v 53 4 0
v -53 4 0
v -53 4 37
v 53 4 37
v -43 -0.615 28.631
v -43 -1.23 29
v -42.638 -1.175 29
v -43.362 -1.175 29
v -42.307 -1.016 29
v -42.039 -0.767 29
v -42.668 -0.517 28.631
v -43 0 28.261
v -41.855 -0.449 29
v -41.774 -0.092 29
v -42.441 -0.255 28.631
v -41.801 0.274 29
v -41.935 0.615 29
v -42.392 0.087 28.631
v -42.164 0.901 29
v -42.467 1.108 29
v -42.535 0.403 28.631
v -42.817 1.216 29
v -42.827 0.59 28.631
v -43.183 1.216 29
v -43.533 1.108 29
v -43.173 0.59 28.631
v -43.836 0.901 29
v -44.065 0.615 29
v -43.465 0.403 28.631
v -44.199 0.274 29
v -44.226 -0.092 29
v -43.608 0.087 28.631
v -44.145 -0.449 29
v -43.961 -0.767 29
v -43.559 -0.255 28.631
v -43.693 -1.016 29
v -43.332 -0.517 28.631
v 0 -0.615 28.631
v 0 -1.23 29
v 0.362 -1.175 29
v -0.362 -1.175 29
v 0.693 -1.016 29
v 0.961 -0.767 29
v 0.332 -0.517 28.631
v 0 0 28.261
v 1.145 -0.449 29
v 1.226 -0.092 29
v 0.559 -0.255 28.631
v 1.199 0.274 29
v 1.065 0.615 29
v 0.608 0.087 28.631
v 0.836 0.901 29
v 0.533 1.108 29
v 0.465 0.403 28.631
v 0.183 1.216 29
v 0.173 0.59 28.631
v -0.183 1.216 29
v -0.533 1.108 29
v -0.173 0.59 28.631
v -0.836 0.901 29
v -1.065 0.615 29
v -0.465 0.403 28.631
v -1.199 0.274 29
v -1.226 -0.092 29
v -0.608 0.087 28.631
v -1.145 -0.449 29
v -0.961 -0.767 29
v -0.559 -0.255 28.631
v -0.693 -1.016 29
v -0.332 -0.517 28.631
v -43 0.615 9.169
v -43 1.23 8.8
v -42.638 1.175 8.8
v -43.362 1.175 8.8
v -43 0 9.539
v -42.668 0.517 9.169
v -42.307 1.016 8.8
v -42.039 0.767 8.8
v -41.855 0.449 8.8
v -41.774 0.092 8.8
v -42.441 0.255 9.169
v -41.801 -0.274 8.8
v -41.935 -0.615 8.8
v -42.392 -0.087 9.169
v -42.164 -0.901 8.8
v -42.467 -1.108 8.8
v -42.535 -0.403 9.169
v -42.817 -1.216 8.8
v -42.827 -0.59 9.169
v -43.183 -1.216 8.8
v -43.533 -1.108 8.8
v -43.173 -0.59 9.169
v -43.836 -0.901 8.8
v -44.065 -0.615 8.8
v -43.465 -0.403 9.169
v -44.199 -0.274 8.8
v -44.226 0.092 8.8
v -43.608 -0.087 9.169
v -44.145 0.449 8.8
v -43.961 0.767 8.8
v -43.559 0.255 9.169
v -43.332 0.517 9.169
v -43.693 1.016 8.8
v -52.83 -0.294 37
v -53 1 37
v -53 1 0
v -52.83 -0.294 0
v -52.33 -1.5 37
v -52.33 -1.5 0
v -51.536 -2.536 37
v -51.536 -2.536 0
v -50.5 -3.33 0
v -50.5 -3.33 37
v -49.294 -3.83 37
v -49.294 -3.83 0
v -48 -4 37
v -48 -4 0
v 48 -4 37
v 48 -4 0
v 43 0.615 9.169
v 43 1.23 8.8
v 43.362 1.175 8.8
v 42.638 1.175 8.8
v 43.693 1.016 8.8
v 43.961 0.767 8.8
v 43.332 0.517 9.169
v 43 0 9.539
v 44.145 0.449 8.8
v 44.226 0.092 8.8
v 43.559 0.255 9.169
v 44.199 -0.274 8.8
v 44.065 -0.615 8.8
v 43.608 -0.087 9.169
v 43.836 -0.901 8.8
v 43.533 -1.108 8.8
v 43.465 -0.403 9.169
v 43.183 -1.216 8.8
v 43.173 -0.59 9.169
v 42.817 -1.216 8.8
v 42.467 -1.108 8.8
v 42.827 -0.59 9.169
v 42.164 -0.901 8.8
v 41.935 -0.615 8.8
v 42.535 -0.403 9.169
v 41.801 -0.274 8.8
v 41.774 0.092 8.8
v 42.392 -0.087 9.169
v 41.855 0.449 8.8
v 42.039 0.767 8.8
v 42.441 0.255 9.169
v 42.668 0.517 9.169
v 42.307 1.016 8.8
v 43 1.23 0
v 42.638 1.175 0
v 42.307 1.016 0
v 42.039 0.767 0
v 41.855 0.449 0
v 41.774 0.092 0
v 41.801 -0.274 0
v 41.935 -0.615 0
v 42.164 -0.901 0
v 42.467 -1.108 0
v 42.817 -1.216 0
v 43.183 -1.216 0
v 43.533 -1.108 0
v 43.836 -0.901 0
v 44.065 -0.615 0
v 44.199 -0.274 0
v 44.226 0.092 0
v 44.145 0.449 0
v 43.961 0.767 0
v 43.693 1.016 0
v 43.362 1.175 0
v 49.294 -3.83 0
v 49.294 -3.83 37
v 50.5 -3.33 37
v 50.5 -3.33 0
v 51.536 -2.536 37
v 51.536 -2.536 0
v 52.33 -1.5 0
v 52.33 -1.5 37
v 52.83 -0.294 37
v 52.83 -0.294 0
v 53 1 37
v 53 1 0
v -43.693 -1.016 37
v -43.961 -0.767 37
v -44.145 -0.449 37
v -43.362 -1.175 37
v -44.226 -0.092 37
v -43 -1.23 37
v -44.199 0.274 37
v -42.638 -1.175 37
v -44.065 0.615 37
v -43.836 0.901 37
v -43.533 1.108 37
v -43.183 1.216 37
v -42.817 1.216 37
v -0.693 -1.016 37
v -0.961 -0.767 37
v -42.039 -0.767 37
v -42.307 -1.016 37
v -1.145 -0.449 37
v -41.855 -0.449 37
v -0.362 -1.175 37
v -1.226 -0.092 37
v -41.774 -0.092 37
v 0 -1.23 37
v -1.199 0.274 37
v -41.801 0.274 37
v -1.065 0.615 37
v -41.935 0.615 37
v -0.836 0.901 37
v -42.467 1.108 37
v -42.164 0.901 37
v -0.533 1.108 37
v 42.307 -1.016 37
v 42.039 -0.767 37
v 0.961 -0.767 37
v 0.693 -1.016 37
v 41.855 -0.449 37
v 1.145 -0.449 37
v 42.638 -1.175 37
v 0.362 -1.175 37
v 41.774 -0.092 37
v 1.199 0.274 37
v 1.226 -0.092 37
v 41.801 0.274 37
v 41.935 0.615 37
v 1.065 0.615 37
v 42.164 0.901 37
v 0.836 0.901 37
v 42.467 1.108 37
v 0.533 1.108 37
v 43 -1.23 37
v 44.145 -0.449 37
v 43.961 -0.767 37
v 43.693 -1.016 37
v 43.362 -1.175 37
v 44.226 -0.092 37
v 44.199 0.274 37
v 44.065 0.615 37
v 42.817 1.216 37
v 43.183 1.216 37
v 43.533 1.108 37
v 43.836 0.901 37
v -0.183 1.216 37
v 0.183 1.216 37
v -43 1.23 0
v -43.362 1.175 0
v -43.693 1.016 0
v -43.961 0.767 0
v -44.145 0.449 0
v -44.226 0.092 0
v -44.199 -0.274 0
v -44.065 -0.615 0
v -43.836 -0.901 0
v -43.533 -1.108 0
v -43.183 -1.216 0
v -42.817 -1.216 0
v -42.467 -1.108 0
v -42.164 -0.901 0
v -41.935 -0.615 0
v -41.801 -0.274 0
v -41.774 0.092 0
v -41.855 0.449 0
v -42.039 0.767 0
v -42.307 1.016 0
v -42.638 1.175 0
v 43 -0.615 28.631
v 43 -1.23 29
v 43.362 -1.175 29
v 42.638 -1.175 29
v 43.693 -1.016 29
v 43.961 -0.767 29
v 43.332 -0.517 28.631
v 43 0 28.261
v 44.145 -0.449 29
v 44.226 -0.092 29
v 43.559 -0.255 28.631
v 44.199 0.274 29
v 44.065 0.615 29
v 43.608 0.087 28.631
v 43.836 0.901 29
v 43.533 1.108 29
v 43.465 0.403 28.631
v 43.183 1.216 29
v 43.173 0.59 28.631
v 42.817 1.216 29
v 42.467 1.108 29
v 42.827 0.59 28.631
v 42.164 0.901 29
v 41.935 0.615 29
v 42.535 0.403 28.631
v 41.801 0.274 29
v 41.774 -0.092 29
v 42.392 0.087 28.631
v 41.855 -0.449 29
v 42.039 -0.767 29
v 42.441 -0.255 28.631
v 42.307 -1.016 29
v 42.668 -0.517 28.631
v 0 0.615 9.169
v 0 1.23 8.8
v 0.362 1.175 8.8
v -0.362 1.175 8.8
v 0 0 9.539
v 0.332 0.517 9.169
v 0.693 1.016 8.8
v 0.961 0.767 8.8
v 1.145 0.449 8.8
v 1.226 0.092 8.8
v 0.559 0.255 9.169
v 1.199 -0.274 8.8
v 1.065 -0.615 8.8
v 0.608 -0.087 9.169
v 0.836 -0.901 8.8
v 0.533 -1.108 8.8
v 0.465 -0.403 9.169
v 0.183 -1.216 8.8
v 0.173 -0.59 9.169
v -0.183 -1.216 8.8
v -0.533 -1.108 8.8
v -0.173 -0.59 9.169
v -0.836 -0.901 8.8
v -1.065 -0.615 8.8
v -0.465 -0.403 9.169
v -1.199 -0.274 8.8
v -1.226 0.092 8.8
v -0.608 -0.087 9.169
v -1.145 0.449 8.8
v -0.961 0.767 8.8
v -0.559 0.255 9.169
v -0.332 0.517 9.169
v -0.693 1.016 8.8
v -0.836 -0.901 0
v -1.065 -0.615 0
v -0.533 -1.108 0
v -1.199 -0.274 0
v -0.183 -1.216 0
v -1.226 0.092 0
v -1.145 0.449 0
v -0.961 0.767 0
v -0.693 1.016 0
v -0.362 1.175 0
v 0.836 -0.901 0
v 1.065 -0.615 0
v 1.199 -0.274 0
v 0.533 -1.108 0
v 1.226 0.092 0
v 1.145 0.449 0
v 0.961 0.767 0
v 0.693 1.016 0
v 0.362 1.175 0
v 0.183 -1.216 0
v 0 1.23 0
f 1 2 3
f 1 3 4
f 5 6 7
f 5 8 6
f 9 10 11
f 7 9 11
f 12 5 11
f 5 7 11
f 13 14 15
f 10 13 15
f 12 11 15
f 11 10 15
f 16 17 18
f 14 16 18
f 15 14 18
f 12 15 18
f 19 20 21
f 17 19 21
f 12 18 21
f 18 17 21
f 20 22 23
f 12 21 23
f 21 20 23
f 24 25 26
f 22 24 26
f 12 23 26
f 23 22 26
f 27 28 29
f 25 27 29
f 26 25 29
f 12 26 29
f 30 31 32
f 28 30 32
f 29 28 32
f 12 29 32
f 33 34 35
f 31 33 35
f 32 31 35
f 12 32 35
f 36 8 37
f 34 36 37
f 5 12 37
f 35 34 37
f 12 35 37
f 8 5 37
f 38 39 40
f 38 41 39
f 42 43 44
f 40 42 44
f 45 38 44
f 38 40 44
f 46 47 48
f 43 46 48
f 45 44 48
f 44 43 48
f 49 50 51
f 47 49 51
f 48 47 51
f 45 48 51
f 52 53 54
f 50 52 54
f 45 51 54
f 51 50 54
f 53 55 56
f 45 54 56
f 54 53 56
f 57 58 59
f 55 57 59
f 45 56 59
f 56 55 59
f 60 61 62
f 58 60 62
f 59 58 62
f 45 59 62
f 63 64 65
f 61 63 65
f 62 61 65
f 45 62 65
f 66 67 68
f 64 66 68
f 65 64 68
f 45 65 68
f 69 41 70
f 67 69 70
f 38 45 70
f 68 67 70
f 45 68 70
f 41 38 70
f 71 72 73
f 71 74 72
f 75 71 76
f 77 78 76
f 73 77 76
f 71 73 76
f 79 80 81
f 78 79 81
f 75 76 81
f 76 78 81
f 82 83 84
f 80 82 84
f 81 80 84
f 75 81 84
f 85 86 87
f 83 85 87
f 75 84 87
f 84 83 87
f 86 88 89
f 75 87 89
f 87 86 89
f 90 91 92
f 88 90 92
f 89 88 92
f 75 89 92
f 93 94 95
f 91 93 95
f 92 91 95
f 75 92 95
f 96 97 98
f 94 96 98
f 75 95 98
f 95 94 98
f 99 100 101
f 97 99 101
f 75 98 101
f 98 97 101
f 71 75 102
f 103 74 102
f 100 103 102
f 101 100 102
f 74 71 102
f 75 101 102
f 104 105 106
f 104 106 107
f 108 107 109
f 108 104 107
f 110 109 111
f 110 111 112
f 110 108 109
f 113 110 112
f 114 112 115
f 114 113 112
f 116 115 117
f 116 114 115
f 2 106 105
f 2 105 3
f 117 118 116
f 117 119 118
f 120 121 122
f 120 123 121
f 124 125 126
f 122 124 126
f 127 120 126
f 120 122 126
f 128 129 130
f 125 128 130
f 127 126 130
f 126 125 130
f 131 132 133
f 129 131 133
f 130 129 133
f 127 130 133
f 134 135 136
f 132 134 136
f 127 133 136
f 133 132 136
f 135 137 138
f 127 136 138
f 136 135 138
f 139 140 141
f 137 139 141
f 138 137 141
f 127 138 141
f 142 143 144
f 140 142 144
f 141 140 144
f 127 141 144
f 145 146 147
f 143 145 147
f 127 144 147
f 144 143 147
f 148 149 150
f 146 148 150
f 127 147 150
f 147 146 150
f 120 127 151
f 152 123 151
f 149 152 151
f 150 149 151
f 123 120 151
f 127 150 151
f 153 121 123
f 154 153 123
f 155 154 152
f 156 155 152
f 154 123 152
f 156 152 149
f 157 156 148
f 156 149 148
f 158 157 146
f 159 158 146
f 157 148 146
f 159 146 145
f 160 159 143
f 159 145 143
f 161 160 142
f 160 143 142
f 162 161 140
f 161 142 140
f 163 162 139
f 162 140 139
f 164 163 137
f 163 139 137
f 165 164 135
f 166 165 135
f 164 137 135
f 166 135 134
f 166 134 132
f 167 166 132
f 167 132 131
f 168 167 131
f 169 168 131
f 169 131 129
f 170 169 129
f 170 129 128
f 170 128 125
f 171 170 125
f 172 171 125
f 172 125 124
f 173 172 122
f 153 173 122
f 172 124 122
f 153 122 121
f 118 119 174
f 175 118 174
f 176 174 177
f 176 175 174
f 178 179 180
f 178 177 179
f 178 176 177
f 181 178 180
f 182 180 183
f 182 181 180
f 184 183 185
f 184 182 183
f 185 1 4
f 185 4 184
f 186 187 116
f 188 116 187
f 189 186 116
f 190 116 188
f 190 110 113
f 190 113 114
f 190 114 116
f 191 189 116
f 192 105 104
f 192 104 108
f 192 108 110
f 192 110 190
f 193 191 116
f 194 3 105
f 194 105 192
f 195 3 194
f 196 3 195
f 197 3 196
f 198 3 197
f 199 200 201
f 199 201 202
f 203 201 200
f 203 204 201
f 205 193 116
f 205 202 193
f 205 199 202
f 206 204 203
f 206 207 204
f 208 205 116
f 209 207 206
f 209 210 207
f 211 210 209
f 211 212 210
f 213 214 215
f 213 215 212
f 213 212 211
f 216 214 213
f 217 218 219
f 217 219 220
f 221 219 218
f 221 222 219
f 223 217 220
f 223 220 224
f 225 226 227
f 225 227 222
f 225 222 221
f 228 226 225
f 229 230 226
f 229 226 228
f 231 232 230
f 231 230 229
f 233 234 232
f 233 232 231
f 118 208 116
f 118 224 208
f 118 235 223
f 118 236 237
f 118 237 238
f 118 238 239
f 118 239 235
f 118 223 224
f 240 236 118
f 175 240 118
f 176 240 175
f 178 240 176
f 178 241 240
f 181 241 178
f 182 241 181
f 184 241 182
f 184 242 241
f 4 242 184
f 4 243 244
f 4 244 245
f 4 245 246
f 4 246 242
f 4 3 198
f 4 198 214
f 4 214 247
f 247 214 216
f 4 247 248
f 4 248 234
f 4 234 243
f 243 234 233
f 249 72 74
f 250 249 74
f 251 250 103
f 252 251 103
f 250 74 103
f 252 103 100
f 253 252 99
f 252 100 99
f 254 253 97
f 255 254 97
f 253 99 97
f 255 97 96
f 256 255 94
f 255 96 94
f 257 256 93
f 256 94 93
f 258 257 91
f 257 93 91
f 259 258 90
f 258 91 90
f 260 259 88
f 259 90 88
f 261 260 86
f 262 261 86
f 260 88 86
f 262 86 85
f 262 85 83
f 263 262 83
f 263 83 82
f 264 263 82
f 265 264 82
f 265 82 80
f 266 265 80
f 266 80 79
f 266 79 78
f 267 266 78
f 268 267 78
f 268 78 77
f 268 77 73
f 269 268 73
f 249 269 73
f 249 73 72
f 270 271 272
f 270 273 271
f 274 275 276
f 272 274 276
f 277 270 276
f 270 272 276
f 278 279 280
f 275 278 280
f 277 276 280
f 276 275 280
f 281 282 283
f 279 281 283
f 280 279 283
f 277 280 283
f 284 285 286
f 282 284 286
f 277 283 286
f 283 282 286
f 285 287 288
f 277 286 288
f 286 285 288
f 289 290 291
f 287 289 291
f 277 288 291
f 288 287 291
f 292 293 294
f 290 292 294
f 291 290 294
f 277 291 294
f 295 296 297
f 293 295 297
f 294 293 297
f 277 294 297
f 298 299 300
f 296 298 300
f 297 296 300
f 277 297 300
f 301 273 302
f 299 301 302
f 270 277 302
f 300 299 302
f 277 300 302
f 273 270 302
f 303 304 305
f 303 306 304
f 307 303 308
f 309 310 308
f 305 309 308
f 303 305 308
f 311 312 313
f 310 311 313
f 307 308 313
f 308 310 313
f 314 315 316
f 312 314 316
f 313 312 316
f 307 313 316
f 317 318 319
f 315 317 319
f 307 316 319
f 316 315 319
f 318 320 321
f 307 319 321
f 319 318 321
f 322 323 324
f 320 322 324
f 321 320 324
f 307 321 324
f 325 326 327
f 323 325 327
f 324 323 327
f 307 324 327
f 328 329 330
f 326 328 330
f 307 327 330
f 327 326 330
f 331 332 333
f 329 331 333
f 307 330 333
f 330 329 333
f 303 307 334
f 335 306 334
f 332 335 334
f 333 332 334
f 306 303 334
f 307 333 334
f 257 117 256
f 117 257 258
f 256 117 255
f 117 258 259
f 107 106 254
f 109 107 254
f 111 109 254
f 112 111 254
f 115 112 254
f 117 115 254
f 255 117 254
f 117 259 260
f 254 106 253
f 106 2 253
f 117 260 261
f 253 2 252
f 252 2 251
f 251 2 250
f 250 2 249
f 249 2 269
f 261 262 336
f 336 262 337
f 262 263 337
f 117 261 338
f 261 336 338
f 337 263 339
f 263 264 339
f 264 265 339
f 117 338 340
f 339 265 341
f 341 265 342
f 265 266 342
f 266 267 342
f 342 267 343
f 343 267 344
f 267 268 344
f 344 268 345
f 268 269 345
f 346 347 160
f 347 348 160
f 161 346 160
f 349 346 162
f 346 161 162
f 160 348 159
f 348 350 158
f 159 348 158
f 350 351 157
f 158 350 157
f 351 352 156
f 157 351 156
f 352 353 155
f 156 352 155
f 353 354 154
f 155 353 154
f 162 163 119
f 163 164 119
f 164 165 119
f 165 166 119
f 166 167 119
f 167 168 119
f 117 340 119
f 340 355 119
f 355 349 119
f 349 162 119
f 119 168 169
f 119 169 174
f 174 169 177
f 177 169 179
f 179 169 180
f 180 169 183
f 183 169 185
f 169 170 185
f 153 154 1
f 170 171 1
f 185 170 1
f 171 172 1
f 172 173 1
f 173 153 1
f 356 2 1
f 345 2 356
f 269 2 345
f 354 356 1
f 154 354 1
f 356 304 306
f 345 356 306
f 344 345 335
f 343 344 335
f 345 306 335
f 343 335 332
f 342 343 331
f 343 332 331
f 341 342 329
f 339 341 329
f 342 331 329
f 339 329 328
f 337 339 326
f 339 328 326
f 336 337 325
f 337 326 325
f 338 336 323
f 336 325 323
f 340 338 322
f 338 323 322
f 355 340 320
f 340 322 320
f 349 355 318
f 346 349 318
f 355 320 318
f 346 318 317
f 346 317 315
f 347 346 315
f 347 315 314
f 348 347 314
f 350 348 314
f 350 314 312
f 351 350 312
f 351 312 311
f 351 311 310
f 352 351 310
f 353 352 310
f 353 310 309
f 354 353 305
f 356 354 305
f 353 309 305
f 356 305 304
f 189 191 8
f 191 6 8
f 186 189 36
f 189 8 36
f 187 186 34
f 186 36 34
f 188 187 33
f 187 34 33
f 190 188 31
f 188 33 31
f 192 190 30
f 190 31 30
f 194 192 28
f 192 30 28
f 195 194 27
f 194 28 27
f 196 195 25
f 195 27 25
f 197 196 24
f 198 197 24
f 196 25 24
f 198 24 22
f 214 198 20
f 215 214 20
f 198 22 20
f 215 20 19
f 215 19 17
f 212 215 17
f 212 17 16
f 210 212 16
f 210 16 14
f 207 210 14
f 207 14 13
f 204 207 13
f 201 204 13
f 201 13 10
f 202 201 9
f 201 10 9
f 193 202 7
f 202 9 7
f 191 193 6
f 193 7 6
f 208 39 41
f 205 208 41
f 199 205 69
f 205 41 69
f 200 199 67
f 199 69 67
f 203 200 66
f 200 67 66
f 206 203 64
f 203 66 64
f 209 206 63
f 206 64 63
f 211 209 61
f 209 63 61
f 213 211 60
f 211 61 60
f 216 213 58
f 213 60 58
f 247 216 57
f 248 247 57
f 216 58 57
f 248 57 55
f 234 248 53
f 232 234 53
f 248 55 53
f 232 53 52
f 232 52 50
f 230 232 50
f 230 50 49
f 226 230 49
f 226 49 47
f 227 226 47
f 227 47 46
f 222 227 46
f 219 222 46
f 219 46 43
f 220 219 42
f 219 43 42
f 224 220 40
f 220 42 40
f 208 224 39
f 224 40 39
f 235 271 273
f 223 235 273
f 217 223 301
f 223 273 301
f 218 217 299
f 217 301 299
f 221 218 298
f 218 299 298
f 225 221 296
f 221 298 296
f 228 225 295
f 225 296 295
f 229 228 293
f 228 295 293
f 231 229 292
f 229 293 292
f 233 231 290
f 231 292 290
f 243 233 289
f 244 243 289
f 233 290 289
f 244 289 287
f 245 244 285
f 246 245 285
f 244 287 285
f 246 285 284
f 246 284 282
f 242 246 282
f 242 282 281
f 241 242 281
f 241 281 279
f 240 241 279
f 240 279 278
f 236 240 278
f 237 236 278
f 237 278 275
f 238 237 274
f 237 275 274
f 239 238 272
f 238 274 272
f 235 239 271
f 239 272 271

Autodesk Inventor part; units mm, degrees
ref_plane "YZ Plane" through (0, 0, 0) normal (1, 0, 0) x (0, 1, 0)
ref_plane "XZ Plane" through (0, 0, 0) normal (0, 1, 0) x (-1, 0, 0)
ref_plane "XY Plane" through (0, 0, 0) normal (0, 0, 1) x (1, 0, 0)
sketch "Sketch1" plane through (0, 0, 0) normal (0, 0, 1) x (1, 0, 0)
  line L0 (-53, 4) -> (53, 4)
  line L1 (53, 4) -> (53, -4)
  line L2 (53, -4) -> (-53, -4)
  line L3 (-53, -4) -> (-53, 4)
  line L4 (-53, 4) -> (53, -4) construction
  line L5 (53, 4) -> (-53, -4) construction
  point P0 (0, 0)
  dimension "d0" = 106
  dimension "d1" = 8
extrude "Extrusion1" add sketch "Sketch1" along normal blind 37
sketch "Sketch2" plane through (0, 0, 37) normal (0, 0, 1) x (1, 0, 0)
  line L0 (-53, 4) -> (-53, -4) projected
  line L1 (53, -4) -> (53, 4) projected
  point P0 (0, 0)
  point P1 (-43, 0)
  point P2 (0, 0)
  point P3 (43, 0)
  dimension "d4" = 10
  dimension "d5" = 10
hole "Hole1" at (-43, 0, 37) at (0, 0, 37) at (43, 0, 37) direction (0, 0, -1) diameter 2.459 depth 8 tip angle 118 thread size "M3x0.5" class "6H" standard "ISO Metric profile"
sketch "Sketch3" plane through (0, 0, 0) normal (0, 0, -1) x (-1, 0, 0)
  circle A0 centre (43, 0) radius 1.2295 projected
  circle A1 centre (0, 0) radius 1.2295 projected
  circle A2 centre (-43, 0) radius 1.2295 projected
hole "Hole2" at (-43, 0, 0) at (0, 0, 0) at (43, 0, 0) direction (0, 0, 1) diameter 2.459 depth 8.8 tip angle 118 thread size "M3x0.5" class "6H" standard "ISO Metric profile"
fillet "Fillet1" radius 5 2 edges at (-53, -4, 18.5) (53, -4, 18.5)
sketch "Sketch4" plane through (0, 0, 37) normal (0, 0, 1) x (1, 0, 0)
  point P0 (0, 0)
  point P1 (-25, 0)
  point P2 (25, 0)
  dimension "d21" = 25
  dimension "d22" = 25
hole "Hole3" [suppressed]
sketch "Sketch5" plane through (0, 0, 0) normal (0, 0, -1) x (-1, 0, 0)
  circle A0 centre (25, 0) radius 1.5 projected
  circle A1 centre (-25, 0) radius 1.5 projected
  point P0 (0, 0)
hole "Hole4" [suppressed]
properties part number "side 2" material "Aluminum 6061"
